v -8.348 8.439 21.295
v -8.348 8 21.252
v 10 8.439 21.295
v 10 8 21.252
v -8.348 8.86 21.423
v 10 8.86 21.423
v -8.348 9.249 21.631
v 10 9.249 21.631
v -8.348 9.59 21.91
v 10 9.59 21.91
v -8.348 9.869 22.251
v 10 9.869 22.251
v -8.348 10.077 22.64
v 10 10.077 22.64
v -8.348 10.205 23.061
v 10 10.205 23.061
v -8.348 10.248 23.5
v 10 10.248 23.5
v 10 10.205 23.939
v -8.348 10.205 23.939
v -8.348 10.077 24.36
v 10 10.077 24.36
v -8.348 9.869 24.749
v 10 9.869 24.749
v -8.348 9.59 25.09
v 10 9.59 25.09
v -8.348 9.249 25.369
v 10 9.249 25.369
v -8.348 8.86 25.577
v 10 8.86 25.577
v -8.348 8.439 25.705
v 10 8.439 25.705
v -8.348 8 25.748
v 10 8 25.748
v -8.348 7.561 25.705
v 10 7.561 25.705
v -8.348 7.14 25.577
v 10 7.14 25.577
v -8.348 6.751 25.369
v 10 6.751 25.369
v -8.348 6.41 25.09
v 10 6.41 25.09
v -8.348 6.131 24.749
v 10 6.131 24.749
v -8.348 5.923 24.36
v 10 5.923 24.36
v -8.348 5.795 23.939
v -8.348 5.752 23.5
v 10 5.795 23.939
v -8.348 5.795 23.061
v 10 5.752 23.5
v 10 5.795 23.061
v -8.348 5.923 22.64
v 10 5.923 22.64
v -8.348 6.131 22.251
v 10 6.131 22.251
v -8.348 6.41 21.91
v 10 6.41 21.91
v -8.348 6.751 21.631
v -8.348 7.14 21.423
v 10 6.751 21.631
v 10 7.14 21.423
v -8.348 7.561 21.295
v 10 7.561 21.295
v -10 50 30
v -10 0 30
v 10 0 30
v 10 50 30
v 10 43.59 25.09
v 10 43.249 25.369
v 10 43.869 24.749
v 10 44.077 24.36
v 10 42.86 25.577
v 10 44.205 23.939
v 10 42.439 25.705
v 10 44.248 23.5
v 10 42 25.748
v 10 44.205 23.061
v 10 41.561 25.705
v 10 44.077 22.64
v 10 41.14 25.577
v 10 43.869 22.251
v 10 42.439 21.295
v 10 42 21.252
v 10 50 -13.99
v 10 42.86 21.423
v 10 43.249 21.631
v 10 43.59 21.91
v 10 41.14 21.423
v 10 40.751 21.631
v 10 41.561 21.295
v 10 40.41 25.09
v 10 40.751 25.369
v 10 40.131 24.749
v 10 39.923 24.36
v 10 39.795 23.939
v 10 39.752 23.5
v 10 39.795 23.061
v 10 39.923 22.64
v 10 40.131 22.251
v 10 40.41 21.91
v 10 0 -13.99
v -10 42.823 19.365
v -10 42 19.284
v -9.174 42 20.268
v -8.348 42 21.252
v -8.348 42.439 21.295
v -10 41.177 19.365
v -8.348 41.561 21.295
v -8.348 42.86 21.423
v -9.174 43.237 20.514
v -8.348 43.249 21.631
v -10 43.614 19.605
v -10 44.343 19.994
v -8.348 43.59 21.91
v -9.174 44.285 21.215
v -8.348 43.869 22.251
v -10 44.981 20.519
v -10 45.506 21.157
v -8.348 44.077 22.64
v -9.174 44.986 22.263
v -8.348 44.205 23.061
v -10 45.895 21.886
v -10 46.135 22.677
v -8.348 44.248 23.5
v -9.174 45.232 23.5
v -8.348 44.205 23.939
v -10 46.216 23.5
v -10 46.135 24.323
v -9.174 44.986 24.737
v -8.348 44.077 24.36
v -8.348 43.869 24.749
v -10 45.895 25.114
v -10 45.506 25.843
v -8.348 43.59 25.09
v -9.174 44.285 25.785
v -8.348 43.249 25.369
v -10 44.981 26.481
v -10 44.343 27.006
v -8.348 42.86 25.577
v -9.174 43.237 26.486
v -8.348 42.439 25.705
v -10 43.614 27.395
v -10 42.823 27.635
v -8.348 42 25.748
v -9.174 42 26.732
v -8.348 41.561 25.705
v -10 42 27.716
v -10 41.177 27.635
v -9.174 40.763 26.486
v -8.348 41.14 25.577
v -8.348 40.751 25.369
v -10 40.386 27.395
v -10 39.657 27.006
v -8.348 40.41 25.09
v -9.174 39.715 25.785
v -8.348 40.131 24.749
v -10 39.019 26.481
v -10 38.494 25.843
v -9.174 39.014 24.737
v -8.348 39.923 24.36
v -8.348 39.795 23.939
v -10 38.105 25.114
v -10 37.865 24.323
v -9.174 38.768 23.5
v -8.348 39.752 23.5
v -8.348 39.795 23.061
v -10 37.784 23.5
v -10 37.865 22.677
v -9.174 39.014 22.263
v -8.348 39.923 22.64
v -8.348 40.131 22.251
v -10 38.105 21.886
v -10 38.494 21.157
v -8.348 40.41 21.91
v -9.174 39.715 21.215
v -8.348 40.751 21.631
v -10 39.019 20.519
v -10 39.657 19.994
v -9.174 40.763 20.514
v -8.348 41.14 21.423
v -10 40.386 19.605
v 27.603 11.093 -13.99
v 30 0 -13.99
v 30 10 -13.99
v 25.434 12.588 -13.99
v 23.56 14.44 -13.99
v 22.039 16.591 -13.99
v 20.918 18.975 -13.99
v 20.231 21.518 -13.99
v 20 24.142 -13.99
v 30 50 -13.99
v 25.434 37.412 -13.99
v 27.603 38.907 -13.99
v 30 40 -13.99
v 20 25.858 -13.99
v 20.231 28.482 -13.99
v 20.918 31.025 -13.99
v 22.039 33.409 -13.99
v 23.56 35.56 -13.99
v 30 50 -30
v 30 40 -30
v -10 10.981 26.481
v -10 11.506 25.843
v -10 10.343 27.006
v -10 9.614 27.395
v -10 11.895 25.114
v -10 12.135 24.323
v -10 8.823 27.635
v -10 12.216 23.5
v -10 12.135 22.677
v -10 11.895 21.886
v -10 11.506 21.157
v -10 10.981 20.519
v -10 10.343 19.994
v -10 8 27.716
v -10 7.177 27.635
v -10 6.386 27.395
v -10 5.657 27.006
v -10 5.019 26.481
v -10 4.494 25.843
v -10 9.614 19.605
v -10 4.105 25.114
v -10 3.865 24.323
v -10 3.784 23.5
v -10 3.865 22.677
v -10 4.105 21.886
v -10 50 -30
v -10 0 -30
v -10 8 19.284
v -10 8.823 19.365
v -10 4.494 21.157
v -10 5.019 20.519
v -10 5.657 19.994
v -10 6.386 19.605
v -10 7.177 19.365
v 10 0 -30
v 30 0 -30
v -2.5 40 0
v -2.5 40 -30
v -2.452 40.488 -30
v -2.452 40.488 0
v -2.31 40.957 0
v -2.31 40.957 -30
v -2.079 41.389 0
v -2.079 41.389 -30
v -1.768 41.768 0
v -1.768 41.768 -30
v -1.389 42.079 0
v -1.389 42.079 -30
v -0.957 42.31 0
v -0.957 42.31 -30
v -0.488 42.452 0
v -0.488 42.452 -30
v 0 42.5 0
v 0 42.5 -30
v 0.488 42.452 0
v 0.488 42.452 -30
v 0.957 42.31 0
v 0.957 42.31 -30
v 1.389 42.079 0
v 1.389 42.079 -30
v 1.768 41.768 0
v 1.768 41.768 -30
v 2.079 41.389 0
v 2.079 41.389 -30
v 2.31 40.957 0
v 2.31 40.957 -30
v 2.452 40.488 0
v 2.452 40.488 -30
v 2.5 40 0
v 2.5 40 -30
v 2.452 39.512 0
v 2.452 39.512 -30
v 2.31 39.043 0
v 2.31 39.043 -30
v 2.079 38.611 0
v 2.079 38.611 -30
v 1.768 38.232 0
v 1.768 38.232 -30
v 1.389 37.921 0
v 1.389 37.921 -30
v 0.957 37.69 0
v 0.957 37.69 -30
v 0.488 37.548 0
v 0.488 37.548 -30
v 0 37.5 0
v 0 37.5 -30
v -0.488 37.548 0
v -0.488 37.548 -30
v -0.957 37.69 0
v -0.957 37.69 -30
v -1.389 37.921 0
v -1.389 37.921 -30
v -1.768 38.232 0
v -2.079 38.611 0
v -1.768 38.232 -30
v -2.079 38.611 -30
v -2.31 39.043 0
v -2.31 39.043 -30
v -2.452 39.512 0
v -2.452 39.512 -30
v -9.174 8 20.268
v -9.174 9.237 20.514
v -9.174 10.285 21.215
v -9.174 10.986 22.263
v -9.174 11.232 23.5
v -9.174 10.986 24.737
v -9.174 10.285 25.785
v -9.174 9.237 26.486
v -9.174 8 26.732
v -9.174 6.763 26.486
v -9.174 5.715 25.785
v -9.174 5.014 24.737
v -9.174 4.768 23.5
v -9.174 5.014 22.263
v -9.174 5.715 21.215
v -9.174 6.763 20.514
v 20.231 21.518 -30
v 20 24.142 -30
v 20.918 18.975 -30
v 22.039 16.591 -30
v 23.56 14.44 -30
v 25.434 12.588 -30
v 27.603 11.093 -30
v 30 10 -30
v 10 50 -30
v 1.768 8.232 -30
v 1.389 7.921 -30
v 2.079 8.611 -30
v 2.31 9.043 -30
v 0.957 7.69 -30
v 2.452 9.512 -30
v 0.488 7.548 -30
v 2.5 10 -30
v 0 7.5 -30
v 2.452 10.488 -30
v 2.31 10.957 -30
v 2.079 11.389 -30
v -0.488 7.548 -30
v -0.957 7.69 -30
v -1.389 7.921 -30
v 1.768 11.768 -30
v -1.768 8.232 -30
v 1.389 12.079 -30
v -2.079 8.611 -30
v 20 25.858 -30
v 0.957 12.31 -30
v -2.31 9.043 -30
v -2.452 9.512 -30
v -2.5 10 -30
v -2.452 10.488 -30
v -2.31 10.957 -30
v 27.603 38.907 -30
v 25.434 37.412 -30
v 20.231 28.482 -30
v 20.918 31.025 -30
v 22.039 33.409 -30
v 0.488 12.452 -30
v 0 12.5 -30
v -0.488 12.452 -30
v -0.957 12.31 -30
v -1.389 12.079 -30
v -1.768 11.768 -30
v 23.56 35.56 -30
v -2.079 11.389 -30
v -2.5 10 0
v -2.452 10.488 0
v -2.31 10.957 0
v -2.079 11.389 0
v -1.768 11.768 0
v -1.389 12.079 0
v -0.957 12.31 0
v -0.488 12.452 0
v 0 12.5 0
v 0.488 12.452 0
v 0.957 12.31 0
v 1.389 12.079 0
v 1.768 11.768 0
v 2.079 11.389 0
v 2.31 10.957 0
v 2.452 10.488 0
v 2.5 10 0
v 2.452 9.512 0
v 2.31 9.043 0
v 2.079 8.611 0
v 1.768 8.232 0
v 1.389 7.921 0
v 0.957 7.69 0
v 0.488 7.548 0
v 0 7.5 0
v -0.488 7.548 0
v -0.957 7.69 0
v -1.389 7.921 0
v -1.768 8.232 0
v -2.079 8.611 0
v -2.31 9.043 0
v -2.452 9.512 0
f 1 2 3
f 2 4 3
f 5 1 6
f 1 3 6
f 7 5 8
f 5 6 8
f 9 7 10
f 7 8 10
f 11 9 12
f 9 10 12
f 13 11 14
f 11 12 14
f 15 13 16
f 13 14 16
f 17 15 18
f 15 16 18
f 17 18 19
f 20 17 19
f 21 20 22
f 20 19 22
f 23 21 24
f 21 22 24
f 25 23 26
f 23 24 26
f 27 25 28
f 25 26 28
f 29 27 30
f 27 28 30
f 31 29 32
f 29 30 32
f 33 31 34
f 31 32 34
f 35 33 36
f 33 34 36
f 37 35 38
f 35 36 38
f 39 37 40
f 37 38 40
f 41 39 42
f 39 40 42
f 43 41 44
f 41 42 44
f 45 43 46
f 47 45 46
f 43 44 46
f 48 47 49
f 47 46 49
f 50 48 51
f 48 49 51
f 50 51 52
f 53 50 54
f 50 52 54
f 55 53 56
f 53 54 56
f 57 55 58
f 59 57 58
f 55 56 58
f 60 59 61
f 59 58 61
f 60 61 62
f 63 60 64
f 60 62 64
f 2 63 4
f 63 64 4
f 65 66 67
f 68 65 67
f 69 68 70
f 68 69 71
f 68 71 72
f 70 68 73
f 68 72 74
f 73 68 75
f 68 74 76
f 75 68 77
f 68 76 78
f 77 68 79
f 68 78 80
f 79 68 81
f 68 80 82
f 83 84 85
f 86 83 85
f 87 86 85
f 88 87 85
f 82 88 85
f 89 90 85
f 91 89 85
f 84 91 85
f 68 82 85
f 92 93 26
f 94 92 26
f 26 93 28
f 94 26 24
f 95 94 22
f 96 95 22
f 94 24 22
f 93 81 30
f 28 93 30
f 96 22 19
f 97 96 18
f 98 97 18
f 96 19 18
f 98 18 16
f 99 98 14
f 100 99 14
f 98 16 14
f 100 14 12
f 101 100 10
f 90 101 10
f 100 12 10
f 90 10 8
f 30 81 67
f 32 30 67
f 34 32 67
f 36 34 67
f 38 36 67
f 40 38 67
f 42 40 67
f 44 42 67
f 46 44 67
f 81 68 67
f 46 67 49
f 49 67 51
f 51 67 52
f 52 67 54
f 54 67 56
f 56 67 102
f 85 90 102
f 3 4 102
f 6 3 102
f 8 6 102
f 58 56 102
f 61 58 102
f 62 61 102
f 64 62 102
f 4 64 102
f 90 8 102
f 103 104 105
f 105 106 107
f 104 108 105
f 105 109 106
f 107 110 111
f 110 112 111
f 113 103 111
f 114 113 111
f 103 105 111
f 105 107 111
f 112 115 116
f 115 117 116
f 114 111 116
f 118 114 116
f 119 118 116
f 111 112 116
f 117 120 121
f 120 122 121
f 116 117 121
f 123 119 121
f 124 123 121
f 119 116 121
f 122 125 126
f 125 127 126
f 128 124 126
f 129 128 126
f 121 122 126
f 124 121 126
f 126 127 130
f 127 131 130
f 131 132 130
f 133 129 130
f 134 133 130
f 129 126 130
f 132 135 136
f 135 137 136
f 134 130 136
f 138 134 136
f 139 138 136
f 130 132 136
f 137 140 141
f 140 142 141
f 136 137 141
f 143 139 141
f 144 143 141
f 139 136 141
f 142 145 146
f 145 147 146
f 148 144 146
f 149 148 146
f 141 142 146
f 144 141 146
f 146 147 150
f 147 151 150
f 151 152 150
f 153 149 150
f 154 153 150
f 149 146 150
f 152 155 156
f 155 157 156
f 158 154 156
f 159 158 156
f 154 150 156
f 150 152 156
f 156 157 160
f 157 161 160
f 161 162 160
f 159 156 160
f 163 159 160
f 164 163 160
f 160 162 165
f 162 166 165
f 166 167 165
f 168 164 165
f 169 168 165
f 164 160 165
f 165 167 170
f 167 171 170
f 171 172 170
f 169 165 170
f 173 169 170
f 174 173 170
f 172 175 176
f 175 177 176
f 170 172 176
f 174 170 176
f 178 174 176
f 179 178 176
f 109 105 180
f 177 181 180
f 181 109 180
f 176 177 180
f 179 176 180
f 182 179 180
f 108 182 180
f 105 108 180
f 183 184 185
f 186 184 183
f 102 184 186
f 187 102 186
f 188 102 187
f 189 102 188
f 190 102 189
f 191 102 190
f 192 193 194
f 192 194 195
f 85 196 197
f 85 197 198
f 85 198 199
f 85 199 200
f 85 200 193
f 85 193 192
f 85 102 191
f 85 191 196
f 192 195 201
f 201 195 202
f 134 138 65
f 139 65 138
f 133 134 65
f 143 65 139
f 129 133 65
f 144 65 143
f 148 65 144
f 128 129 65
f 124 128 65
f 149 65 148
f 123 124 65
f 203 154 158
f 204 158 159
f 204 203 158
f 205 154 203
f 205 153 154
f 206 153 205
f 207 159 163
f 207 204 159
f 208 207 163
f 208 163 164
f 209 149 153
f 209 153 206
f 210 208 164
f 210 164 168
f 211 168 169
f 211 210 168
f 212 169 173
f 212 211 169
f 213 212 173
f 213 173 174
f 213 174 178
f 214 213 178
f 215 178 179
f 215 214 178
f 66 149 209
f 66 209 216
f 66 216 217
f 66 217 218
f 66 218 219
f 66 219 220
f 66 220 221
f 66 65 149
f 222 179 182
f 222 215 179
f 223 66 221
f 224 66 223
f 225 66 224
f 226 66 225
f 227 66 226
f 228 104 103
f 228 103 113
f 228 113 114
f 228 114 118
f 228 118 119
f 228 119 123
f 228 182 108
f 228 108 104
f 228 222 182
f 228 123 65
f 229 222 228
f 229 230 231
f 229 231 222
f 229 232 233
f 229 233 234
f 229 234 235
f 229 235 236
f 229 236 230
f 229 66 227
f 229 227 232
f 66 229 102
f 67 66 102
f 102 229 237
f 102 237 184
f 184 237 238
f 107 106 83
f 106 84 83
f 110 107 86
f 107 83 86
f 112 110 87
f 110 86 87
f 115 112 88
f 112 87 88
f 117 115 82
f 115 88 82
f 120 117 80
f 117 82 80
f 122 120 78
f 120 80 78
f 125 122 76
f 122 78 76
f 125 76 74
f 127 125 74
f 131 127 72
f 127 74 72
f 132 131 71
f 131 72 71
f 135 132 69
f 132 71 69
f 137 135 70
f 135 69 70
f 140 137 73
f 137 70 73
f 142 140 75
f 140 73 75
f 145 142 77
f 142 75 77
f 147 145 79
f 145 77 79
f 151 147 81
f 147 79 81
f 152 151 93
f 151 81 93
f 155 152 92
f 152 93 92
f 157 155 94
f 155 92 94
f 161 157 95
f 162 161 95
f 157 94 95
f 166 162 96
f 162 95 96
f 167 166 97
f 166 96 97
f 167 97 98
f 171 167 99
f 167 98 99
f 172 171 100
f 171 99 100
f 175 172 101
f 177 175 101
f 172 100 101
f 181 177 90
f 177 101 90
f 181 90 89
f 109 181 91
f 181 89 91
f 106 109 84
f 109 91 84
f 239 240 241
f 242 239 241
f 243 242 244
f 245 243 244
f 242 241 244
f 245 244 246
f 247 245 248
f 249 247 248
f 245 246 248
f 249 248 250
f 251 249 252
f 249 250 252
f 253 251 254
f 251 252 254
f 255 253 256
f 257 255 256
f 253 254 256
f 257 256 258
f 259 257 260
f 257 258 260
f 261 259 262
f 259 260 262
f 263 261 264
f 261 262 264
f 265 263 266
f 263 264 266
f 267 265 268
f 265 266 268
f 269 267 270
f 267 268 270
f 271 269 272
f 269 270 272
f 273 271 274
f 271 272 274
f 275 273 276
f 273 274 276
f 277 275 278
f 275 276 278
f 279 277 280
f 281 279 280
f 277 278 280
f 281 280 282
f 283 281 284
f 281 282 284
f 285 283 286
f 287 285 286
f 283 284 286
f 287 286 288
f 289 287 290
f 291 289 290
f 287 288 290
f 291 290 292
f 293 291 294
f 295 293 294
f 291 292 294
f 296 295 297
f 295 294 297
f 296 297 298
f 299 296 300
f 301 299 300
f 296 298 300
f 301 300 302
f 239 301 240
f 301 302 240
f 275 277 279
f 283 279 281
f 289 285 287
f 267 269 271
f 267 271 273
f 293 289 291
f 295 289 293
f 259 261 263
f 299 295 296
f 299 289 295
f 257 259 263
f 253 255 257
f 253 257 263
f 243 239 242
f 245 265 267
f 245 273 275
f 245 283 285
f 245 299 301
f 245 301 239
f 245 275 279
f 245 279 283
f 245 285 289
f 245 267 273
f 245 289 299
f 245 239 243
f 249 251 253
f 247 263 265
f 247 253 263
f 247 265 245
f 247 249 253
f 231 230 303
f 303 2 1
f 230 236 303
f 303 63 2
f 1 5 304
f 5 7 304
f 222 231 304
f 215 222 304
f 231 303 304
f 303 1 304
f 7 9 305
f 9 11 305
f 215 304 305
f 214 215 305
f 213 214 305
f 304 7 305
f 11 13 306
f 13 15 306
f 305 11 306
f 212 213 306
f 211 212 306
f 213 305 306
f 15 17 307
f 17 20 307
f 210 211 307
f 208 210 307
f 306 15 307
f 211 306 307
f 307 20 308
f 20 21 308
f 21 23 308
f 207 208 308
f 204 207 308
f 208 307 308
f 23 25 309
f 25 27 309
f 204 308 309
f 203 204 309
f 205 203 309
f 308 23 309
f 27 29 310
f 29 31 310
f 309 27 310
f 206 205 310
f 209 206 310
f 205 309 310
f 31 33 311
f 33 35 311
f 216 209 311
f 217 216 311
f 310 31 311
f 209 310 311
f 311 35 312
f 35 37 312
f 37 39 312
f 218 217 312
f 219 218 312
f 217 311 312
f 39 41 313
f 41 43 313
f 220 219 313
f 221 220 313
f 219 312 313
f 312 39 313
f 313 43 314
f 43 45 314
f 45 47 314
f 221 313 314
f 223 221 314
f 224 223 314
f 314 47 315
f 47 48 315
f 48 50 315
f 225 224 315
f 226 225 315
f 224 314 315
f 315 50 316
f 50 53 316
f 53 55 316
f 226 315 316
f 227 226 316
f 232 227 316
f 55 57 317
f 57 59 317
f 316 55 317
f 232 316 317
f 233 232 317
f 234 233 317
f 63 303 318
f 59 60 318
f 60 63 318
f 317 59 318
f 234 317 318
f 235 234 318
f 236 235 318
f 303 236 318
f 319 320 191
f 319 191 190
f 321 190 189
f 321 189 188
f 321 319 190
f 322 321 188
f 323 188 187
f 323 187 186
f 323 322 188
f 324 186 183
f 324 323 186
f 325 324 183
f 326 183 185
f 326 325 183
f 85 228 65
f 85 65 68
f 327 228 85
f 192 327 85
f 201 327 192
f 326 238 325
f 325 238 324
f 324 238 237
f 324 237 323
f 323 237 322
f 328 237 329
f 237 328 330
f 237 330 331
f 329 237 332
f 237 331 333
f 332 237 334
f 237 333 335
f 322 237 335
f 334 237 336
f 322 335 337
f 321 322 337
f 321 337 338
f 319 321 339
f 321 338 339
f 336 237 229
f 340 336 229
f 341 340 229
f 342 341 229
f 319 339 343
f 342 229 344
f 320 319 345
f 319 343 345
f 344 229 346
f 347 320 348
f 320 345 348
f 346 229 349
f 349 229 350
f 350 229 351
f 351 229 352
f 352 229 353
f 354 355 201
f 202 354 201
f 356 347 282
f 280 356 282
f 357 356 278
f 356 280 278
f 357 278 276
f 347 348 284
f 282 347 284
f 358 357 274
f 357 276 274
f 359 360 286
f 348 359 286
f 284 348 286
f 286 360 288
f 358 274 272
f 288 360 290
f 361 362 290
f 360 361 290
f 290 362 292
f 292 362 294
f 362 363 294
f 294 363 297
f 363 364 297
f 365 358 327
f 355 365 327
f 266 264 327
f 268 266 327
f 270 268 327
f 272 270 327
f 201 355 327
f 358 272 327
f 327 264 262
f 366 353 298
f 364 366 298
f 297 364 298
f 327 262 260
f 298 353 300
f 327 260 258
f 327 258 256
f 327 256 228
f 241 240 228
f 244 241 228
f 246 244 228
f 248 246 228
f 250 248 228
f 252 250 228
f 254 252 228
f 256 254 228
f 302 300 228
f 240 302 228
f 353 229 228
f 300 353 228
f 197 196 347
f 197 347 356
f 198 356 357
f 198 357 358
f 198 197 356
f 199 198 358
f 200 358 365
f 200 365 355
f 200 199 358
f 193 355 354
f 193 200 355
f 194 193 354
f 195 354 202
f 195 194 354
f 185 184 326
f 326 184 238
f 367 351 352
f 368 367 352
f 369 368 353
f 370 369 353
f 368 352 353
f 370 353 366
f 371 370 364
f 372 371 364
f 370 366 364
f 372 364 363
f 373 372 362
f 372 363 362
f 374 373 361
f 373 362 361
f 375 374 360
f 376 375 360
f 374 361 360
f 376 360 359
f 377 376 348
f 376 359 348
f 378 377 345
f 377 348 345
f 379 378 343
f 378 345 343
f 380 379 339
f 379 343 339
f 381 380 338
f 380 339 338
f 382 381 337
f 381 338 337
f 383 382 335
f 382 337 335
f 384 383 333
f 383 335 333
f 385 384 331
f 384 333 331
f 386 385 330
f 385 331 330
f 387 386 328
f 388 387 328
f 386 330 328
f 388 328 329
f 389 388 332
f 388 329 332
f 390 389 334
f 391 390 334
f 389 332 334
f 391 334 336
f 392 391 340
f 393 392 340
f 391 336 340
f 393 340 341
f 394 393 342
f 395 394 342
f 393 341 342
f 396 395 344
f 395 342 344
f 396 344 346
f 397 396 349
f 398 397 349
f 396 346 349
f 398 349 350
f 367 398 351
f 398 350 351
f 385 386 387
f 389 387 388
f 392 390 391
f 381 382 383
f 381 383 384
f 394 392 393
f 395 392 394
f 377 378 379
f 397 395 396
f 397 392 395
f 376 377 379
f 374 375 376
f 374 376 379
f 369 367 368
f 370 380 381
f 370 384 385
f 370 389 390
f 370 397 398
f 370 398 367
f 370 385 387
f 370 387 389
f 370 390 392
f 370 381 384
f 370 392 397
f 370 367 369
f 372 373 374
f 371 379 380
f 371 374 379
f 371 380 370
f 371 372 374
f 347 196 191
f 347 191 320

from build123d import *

# Parameters (mm, degrees)
SKETCH3_W                                         = 20
SKETCH3_H                                         = 60
SKETCH3_H_2                                       = 16.009607205
BOSS_EXTRUDE1_DEPTH                               = 50
SKETCH4_W                                         = 16.009607205
SKETCH4_H                                         = 30
CUT_EXTRUDE1_DEPTH                                = 10
FILLET4_R                                         = 15
CSK_FOR_8_FLAT_HEAD_MACHINE_SCREW_100_D           = 4.4958
CSK_FOR_8_FLAT_HEAD_MACHINE_SCREW_100_CSINK_D     = 8.4328
CSK_FOR_8_FLAT_HEAD_MACHINE_SCREW_100_CSINK_ANGLE = 100
SKETCH7_R                                         = 2.5
CUT_EXTRUDE2_DEPTH                                = 30


with BuildPart() as part:
    # Sketch3 → Boss-Extrude1 (new body)
    with BuildSketch(Plane(origin=(0, 0, 0), x_dir=(1, 0, 0), z_dir=(0, 1, 0))):
        Rectangle(SKETCH3_W, SKETCH3_H)
        with Locations((20, 21.995196398)):
            Rectangle(SKETCH3_W, SKETCH3_H_2)
    extrude(amount=BOSS_EXTRUDE1_DEPTH)

    # Sketch4 → Cut-Extrude1 (cut)
    with BuildSketch(Plane(origin=(30, 0, 0), x_dir=(0, 0, -1), z_dir=(1, 0, 0))):
        with Locations((21.995196398, 25)):
            Rectangle(SKETCH4_W, SKETCH4_H)
    extrude(amount=-CUT_EXTRUDE1_DEPTH, mode=Mode.SUBTRACT)

    # Fillet4
    # the kernel refuses this fillet: 15 mm, written as the material it adds along each edge
    with BuildSketch(Plane(origin=(20, 10, -30), x_dir=(1, 0, 0), z_dir=(0, 0, 1))) as fillet4_piece_1:
        with BuildLine():
            CenterArc((15, 14.142135624), FILLET4_R, 180, 70.528779366)
            Line((0, 14.142135624), (-0.3, 14.142135624))
            Line((-0.3, 14.142135624), (-0.3, 0))
            Line((-0.3, 0), (0, -0.3))
            ThreePointArc((0, -0.3), (5, -0.3), (9.9, -0.282842712))
            Line((9.9, -0.282842712), (10, 0))
        make_face()
    extrude(amount=16.009607205)
    with BuildSketch(Plane(origin=(20, 40, -13.990392795), x_dir=(0, -1, 0), z_dir=(0, 0, -1))) as fillet4_piece_2:
        with BuildLine():
            CenterArc((14.142135624, -15), FILLET4_R, 90, 70.528779366)
            Line((0, -10), (-0.282842712, -9.9))
            ThreePointArc((-0.282842712, -9.9), (-0.3, -5), (-0.3, 0))
            Line((-0.3, 0), (0, 0.3))
            Line((0, 0.3), (14.142135624, 0.3))
            Line((14.142135624, 0.3), (14.142135624, 0))
        make_face()
    extrude(amount=16.009607205)

    # CSK for #8 Flat Head Machine Screw (100)1 (through all)
    with Locations(Plane.ZY.offset(10)):
        with Locations((23.5, 8), (23.5, 42)):
            CounterSinkHole(CSK_FOR_8_FLAT_HEAD_MACHINE_SCREW_100_D / 2, CSK_FOR_8_FLAT_HEAD_MACHINE_SCREW_100_CSINK_D / 2, counter_sink_angle=CSK_FOR_8_FLAT_HEAD_MACHINE_SCREW_100_CSINK_ANGLE)

    # Sketch7 → Cut-Extrude2 (cut)
    with BuildSketch(Plane(origin=(0, 0, -30), x_dir=(-1, 0, 0), z_dir=(0, 0, -1))):
        with Locations((0, 10)):
            Circle(SKETCH7_R)
        with Locations((0, 40)):
            Circle(SKETCH7_R)
    extrude(amount=-CUT_EXTRUDE2_DEPTH, mode=Mode.SUBTRACT)


solid = part.part
